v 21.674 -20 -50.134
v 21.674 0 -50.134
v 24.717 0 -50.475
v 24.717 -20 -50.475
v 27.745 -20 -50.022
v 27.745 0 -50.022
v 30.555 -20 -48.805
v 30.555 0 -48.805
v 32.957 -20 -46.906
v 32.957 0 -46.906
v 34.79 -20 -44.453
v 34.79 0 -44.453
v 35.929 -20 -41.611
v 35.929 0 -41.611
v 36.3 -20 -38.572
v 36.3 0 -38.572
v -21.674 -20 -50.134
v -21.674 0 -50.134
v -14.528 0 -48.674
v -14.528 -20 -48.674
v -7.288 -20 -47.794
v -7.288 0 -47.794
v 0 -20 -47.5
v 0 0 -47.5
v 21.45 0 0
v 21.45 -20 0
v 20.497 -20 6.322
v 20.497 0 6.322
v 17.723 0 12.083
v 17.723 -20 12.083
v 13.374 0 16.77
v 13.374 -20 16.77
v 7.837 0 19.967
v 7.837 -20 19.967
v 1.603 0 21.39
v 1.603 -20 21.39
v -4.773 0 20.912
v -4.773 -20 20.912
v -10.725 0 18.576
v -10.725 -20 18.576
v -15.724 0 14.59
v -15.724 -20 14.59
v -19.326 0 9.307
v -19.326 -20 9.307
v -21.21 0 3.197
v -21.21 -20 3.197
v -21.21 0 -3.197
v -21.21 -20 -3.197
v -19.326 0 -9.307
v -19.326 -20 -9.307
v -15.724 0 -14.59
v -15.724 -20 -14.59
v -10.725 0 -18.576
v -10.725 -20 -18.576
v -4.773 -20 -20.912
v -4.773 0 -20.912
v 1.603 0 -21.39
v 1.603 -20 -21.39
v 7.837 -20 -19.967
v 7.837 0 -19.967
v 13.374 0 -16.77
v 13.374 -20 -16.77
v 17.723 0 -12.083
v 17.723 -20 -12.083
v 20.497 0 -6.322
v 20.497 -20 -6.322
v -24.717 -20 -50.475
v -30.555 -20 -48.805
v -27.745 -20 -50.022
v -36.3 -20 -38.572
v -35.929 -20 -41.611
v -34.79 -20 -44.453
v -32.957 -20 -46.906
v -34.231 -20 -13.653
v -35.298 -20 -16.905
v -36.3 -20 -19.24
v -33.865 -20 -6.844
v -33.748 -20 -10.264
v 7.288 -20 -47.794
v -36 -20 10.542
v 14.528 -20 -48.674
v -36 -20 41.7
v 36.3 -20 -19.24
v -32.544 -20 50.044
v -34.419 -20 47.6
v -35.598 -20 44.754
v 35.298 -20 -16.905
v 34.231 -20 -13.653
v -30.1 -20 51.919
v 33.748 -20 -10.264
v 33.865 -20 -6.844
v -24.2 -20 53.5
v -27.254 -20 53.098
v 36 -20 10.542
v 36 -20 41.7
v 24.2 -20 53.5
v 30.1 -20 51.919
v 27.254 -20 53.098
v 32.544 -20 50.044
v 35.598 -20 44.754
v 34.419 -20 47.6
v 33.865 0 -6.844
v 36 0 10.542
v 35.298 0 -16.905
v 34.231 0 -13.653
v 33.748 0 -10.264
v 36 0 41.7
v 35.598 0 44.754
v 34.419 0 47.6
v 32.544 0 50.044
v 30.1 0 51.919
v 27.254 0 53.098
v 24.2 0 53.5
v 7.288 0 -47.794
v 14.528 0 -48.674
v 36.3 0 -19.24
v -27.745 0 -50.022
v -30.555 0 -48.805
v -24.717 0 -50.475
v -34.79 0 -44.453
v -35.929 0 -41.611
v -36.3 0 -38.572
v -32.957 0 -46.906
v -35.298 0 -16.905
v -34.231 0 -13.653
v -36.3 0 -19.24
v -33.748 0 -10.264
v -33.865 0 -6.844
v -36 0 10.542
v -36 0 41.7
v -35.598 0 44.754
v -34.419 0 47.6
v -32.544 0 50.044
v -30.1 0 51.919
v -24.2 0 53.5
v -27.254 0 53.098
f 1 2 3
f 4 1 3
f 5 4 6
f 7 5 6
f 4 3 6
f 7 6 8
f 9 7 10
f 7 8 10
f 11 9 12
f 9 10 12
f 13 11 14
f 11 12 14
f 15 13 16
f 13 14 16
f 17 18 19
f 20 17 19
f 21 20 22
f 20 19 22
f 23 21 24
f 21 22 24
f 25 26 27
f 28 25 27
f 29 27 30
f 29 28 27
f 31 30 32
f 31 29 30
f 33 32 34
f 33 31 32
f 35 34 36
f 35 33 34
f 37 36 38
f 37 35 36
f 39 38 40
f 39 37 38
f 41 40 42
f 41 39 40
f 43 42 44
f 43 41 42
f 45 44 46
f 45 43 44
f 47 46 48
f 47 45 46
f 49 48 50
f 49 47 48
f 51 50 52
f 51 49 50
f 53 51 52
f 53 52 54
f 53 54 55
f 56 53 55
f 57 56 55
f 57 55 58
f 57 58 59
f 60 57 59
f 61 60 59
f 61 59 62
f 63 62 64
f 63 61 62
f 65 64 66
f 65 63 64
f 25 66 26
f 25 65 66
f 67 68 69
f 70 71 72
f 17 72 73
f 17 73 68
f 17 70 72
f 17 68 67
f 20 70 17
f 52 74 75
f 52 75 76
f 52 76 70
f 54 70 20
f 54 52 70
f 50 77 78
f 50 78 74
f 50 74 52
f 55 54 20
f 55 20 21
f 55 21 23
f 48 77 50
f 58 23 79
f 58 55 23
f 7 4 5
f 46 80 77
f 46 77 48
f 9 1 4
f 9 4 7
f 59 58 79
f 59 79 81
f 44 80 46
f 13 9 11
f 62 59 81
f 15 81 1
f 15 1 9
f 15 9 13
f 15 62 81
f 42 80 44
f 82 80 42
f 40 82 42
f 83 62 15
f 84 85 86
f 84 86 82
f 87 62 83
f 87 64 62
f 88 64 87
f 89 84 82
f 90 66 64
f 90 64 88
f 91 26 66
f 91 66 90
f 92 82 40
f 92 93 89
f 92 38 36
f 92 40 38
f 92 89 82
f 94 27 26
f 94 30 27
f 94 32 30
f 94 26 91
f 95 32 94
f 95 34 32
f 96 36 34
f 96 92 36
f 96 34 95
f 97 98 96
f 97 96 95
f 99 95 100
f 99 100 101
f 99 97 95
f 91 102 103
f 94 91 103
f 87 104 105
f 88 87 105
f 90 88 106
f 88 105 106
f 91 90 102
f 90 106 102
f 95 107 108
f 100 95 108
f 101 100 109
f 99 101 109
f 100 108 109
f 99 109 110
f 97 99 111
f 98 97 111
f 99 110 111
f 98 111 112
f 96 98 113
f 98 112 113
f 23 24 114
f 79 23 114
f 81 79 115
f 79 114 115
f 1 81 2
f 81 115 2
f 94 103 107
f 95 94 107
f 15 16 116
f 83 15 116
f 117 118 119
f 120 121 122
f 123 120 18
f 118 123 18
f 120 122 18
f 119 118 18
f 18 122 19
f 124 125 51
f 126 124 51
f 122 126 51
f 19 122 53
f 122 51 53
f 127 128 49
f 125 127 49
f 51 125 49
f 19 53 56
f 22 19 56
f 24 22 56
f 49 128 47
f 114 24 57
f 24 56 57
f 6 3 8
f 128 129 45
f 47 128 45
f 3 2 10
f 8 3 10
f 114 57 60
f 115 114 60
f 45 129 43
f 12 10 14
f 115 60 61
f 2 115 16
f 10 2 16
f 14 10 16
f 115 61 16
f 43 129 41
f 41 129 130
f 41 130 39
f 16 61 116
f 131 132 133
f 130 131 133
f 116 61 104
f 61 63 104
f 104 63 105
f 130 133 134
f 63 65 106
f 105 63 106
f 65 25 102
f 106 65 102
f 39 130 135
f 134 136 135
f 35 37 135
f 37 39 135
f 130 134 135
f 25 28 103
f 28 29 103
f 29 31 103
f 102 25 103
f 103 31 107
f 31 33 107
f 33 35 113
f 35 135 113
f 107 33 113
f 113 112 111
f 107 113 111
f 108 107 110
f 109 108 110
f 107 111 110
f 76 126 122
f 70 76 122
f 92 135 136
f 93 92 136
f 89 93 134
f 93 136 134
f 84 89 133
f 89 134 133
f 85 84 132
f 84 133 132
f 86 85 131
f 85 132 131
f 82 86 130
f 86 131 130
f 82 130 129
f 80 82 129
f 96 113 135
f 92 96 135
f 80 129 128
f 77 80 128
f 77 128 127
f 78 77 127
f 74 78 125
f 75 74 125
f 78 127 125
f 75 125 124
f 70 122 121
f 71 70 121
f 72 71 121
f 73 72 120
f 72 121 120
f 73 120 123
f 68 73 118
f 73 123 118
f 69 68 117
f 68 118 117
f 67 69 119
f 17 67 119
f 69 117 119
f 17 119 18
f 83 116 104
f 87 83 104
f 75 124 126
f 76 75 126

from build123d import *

# Parameters (mm, degrees)
F0_R     = 21.45
F1_DEPTH = 20


with BuildPart() as f1:
    # F0 (on Front) → F1 (new body)
    with BuildSketch(Plane.XZ):
        with BuildLine():
            Line((24.2, 53.5), (-24.2, 53.5))
            ThreePointArc((-24.2, 53.5), (-32.54386, 50.04386), (-36, 41.7))
            Line((-36, 41.7), (-36, 10.541781))
            Line((-36, 10.541781), (-33.86535, -6.843548))
            ThreePointArc((-33.86535, -6.843548), (-33.914779, -11.969259), (-35.298202, -16.904995))
            Line((-35.298202, -16.904995), (-36.299529, -19.24014))
            Line((-36.299529, -19.24014), (-36.299529, -38.57162))
            ThreePointArc((-36.299529, -38.57162), (-31.817885, -47.933904), (-21.673998, -50.133694))
            ThreePointArc((-21.673998, -50.133694), (-10.916713, -48.160836), (0, -47.5))
            ThreePointArc((0, -47.5), (10.916713, -48.160836), (21.673998, -50.133694))
            ThreePointArc((21.673998, -50.133694), (31.817885, -47.933904), (36.299529, -38.57162))
            Line((36.299529, -38.57162), (36.299529, -19.24014))
            Line((36.299529, -19.24014), (35.298202, -16.904995))
            ThreePointArc((35.298202, -16.904995), (33.914779, -11.969259), (33.86535, -6.843548))
            Line((33.86535, -6.843548), (36, 10.541781))
            Line((36, 10.541781), (36, 41.7))
            ThreePointArc((36, 41.7), (32.54386, 50.04386), (24.2, 53.5))
        make_face()
        Circle(F0_R, mode=Mode.SUBTRACT)
    extrude(amount=F1_DEPTH)


solid = f1.part
